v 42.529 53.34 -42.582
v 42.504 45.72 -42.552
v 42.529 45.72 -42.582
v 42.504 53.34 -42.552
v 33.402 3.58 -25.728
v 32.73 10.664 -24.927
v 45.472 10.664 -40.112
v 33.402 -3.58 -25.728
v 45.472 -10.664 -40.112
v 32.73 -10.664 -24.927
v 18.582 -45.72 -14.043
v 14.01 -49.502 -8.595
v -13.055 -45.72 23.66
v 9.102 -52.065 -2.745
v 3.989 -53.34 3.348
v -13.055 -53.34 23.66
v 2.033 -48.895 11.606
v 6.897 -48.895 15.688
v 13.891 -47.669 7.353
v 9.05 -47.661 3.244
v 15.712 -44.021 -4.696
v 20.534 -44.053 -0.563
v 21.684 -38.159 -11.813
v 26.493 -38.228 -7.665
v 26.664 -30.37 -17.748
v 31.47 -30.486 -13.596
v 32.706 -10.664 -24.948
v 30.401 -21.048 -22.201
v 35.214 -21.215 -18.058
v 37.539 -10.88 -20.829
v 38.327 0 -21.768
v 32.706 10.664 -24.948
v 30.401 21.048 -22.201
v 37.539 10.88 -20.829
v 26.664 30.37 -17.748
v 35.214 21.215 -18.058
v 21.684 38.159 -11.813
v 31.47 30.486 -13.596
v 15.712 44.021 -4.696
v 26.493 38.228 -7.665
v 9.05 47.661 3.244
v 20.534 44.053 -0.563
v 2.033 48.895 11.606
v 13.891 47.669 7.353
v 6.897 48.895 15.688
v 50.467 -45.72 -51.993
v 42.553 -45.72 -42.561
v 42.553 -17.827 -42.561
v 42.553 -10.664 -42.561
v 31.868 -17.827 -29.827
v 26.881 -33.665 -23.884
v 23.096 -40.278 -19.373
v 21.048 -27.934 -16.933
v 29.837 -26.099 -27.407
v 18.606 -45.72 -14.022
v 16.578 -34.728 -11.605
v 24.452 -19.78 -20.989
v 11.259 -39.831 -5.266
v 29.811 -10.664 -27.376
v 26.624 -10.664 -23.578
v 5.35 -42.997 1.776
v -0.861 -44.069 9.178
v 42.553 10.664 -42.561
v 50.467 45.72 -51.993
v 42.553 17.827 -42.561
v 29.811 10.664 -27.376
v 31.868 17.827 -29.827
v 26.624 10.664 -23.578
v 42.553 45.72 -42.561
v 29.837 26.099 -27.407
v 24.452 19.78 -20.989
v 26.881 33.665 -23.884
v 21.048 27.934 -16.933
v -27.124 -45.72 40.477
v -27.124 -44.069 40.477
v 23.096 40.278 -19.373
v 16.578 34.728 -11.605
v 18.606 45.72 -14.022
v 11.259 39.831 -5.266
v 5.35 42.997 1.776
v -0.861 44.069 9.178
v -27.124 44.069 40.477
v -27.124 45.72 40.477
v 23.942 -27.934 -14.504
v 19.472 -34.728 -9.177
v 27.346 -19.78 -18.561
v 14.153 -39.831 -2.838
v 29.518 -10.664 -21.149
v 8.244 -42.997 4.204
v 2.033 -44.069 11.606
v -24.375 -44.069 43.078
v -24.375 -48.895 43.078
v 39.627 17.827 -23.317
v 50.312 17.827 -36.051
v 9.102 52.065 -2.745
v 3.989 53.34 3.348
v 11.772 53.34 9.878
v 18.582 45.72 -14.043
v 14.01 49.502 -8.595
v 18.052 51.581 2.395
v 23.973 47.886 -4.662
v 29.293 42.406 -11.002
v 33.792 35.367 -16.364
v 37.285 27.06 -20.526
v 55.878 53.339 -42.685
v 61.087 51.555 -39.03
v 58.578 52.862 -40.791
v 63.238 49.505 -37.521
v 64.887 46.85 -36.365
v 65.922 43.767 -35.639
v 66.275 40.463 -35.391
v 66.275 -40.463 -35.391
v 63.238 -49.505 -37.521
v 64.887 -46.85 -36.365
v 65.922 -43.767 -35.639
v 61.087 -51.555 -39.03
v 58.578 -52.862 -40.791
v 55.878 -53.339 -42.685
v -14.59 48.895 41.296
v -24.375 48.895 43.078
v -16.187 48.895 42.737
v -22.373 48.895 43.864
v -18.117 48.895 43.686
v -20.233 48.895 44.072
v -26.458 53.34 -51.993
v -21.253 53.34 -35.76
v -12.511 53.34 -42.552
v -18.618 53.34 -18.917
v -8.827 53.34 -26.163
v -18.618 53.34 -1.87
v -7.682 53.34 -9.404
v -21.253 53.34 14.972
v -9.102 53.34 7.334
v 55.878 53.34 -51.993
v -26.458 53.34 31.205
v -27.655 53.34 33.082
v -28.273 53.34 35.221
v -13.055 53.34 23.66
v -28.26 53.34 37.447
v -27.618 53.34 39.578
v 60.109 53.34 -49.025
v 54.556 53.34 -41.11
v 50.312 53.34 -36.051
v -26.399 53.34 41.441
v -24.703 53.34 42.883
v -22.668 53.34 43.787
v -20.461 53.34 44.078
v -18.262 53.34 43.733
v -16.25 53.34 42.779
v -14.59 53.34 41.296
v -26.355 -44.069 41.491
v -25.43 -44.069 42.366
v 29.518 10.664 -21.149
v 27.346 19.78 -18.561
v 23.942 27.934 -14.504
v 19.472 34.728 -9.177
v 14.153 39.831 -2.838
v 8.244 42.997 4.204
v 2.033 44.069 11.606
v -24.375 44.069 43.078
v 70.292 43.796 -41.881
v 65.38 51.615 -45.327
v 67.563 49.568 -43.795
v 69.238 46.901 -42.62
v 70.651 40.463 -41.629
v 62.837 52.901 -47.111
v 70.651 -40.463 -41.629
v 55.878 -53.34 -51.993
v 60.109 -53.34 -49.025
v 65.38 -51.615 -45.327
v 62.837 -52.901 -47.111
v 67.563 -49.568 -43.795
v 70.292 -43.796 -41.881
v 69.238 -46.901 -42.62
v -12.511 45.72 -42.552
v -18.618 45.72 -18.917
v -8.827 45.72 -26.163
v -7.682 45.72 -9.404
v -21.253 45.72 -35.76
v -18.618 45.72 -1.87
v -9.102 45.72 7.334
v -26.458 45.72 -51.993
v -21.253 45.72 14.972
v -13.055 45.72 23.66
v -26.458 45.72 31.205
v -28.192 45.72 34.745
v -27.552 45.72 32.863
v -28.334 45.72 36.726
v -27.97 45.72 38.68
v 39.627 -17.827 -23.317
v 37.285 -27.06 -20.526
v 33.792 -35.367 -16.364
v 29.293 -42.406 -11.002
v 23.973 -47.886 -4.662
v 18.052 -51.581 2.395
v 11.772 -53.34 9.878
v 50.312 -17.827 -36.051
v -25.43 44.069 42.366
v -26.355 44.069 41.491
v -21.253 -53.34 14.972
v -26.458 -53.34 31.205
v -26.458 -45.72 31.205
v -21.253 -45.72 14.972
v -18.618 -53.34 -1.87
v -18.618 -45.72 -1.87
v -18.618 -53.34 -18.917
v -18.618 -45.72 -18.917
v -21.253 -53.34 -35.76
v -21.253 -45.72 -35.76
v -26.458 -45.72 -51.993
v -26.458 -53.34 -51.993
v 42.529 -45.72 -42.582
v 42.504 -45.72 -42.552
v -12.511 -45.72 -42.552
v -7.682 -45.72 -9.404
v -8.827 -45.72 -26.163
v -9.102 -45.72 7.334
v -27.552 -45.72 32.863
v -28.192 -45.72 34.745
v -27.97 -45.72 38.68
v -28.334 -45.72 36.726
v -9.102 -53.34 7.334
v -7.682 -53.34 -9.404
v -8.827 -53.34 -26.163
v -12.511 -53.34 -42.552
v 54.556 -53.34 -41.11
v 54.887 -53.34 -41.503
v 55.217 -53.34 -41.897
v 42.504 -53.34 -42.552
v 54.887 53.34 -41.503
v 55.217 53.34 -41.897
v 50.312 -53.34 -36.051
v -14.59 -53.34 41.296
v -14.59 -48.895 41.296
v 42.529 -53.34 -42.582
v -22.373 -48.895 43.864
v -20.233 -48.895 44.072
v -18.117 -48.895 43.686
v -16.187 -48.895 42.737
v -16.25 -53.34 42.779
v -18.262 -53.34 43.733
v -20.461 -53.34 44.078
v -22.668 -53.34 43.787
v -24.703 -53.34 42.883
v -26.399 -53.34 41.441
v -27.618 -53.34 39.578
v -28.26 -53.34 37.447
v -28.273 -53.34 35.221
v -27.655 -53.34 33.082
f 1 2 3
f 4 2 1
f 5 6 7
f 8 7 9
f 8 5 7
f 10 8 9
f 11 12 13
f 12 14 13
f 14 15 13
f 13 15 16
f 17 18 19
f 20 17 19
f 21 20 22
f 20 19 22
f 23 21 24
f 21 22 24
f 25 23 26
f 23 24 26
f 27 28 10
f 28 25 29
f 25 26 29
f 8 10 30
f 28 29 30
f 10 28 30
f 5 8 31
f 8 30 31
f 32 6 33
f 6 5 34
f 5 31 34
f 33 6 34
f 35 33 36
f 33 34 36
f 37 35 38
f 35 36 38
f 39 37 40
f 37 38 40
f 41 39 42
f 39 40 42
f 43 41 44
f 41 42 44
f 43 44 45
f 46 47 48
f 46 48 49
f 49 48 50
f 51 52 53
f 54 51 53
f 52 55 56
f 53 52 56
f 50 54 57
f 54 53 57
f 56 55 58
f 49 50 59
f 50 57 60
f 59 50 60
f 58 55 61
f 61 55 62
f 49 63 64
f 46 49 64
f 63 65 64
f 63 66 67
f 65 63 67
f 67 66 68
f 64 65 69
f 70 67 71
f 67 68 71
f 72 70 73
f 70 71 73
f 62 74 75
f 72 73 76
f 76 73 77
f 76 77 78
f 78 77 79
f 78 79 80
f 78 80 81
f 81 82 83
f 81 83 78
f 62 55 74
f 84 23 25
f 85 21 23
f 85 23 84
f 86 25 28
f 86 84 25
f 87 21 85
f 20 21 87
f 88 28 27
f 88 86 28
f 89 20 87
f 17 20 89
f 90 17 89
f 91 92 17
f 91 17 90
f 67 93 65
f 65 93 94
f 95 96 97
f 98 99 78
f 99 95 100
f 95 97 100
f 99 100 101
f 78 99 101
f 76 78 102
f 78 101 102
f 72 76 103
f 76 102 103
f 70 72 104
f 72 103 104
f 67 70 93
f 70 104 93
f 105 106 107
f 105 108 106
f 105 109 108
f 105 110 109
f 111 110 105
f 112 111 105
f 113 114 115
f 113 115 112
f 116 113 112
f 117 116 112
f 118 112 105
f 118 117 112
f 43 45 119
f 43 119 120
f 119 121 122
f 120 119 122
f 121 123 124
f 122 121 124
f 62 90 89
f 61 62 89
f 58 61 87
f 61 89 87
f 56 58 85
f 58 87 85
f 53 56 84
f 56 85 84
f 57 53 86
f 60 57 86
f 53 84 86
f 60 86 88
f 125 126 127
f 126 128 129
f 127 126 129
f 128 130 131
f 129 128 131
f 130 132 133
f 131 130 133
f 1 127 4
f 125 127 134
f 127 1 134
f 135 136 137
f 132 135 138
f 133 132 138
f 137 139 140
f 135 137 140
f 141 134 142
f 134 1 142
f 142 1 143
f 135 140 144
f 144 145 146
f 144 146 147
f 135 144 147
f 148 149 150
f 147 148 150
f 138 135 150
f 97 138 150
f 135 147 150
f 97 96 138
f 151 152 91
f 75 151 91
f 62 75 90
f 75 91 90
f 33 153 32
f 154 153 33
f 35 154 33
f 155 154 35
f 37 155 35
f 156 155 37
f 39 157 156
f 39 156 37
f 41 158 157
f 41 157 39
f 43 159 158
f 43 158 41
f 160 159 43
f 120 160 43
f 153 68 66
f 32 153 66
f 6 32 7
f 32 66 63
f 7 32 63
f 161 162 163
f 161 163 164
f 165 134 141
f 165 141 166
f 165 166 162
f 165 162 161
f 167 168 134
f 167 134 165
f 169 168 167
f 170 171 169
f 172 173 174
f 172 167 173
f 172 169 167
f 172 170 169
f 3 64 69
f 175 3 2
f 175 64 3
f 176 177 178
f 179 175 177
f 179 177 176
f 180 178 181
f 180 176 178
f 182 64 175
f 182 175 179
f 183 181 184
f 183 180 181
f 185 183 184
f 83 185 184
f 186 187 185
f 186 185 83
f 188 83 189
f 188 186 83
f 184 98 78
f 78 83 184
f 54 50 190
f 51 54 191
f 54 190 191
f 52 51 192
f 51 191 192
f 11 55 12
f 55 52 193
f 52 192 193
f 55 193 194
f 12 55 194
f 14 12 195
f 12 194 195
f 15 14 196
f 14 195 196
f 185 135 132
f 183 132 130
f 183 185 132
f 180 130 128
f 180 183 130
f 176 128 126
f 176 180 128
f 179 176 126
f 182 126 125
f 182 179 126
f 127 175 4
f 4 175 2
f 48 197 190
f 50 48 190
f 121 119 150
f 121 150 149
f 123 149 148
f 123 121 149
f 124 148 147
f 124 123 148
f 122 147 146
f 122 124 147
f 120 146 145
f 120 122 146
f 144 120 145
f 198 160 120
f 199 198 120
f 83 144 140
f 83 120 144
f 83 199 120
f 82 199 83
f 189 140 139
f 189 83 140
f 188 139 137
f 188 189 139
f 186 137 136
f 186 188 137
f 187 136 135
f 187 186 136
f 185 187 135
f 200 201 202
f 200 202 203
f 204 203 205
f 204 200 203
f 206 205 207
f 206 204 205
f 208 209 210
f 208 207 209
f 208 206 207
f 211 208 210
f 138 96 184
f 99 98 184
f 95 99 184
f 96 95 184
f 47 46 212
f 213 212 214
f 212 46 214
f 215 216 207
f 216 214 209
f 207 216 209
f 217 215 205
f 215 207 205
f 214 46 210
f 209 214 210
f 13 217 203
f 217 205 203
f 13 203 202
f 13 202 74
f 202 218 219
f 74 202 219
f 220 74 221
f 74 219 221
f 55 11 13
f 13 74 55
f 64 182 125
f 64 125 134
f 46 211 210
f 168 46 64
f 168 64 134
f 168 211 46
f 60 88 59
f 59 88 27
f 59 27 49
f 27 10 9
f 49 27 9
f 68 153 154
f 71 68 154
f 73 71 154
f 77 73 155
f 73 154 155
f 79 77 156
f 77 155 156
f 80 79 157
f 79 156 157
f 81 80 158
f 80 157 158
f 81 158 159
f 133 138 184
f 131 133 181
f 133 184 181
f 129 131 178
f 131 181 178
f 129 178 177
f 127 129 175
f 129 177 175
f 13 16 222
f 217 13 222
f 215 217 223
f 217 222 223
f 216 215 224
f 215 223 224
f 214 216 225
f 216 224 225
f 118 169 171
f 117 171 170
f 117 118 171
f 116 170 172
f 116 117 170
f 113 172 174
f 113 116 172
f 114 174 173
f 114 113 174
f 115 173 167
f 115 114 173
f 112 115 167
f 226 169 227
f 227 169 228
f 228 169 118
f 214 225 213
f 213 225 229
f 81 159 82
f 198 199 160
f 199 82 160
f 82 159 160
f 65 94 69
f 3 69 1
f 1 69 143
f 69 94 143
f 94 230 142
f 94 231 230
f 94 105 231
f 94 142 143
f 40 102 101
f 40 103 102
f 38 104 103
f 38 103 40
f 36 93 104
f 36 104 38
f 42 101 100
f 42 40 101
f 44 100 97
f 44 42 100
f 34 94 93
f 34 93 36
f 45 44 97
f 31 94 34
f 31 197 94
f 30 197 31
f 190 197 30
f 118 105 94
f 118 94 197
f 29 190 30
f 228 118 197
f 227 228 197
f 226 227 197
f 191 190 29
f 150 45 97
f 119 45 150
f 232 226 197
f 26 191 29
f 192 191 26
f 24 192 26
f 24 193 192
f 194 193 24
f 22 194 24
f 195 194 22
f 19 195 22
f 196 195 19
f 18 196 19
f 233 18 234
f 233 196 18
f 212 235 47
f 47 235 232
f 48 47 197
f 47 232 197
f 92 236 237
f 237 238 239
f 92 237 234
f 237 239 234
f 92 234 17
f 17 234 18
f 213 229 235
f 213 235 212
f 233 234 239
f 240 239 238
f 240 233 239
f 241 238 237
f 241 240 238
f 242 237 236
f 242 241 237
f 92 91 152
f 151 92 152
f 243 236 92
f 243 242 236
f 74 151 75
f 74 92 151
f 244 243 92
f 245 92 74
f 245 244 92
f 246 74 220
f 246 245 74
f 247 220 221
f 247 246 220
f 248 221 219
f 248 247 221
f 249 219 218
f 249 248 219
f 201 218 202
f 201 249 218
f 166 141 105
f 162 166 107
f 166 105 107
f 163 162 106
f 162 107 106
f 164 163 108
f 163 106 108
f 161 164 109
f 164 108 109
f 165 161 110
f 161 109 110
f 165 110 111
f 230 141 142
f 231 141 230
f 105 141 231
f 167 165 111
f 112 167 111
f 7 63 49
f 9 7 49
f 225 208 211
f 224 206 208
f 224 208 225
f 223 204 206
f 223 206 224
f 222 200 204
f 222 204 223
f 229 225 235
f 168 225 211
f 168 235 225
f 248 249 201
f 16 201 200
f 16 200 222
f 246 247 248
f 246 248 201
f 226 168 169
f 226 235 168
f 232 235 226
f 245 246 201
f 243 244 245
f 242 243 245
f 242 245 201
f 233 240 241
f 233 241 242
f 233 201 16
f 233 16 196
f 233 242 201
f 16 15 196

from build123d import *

# Parameters (mm, degrees)
F1_DEPTH  = 53.34
F2_W      = 4.826
F2_H      = 32.1946403572
F3_DEPTH  = 6.35
F5_DEPTH  = 106.68
F7_W      = 91.44
F7_H      = 183.6228075896
F8_DEPTH  = 58.928
F9_DEPTH  = 25.4
F10_R     = 12.8774151417
F11_DEPTH = 10.16
F13_DEPTH = 25.4
F15_DEPTH = 3.81


# Not quite as in the source:
# - a feature names something its author has since deleted; it is built from what else it names


with BuildPart() as f1:
    # F0 (on Front) → F1 (new body, symmetric)
    with BuildSketch(Plane.XZ):
        with BuildLine():
            ThreePointArc((-26.4580316219, 31.2050478526), (-18.2875299748, -10.3937397156), (-26.4580316219, -51.9925272838))
            Line((-26.4580316219, -51.9925272838), (55.8778569108, -51.9925272838))
            Line((55.8778569108, -51.9925272838), (70.650836429, -41.6293909539))
            Line((70.650836429, -41.6293909539), (66.2748063527, -35.3912212887))
            Line((66.2748063527, -35.3912212887), (55.8778569108, -42.6846047493))
            Line((55.8778569108, -42.6846047493), (-14.5902915946, 41.2960643955))
            ThreePointArc((-14.5902915946, 41.2960643955), (-25.6027276184, 42.2233043466), (-26.4580316219, 31.2050478526))
        make_face()
    extrude(amount=F1_DEPTH, both=True)

    # F2 (on face) → F3 (cut)
    with BuildSketch(Plane(origin=(11.772407622, 0, 9.8782228937), x_dir=(0, 1, 0), z_dir=(0.7660444431, 0, 0.6427876097))):
        with BuildLine():
            ThreePointArc((-44.069, 28.7653259742), (-47.673235573, 18.4461288519), (-48.895, 7.584101647))
            Line((-48.895, 7.584101647), (-44.069, 7.584101647))
            Line((-44.069, 7.584101647), (-44.069, 28.7653259742))
        make_face()
        with BuildLine():
            ThreePointArc((44.069, 28.7653259742), (47.673235573, 18.4461288519), (48.895, 7.584101647))
            Line((48.895, 7.584101647), (48.895, 41.0130793115))
            Line((48.895, 41.0130793115), (44.069, 41.0130793115))
            Line((44.069, 41.0130793115), (44.069, 28.7653259742))
        make_face()
        with BuildLine():
            Line((-44.069, 41.0130793115), (-35.6822711903, 41.0130793115))
            ThreePointArc((-35.6822711903, 41.0130793115), (-19.4449371571, 52.4462844288), (0, 56.479101647))
            Line((0, 56.479101647), (0, 73.2077196687))
            Line((0, 73.2077196687), (-44.069, 73.2077196687))
            Line((-44.069, 73.2077196687), (-44.069, 41.0130793115))
        make_face()
        with Locations((-46.482, 57.1103994901)):
            Rectangle(F2_W, F2_H)
        with BuildLine():
            ThreePointArc((0, 56.479101647), (-19.4449371571, 52.4462844288), (-35.6822711903, 41.0130793115))
            Line((-35.6822711903, 41.0130793115), (-28.7155047544, 41.0130793115))
            ThreePointArc((-28.7155047544, 41.0130793115), (-15.3116809054, 48.9075718407), (0, 51.653101647))
            Line((0, 51.653101647), (0, 56.479101647))
        make_face()
        with BuildLine():
            Line((28.7155047544, 41.0130793115), (35.6822711903, 41.0130793115))
            ThreePointArc((35.6822711903, 41.0130793115), (19.4449371571, 52.4462844288), (0, 56.479101647))
            Line((0, 56.479101647), (0, 51.653101647))
            ThreePointArc((0, 51.653101647), (15.3116809054, 48.9075718407), (28.7155047544, 41.0130793115))
        make_face()
        with BuildLine():
            Line((-48.895, 41.0130793115), (-48.895, 7.584101647))
            ThreePointArc((-48.895, 7.584101647), (-47.673235573, 18.4461288519), (-44.069, 28.7653259742))
            Line((-44.069, 28.7653259742), (-44.069, 41.0130793115))
            Line((-44.069, 41.0130793115), (-48.895, 41.0130793115))
        make_face()
        with BuildLine():
            ThreePointArc((0, 56.479101647), (19.4449371571, 52.4462844288), (35.6822711903, 41.0130793115))
            Line((35.6822711903, 41.0130793115), (44.069, 41.0130793115))
            Line((44.069, 41.0130793115), (44.069, 73.082752475))
            Line((44.069, 73.082752475), (0, 73.2077196687))
            Line((0, 73.2077196687), (0, 56.479101647))
        make_face()
        with BuildLine():
            Line((-44.069, 41.0130793115), (-44.069, 28.7653259742))
            ThreePointArc((-44.069, 28.7653259742), (-40.3431305128, 35.2093228303), (-35.6822711903, 41.0130793115))
            Line((-35.6822711903, 41.0130793115), (-44.069, 41.0130793115))
        make_face()
        with BuildLine():
            ThreePointArc((-35.6822711903, 41.0130793115), (-40.3431305128, 35.2093228303), (-44.069, 28.7653259742))
            Line((-44.069, 28.7653259742), (-44.069, 7.584101647))
            ThreePointArc((-44.069, 7.584101647), (-40.0470993957, 25.9772142435), (-28.7155047544, 41.0130793115))
            Line((-28.7155047544, 41.0130793115), (-35.6822711903, 41.0130793115))
        make_face()
        with BuildLine():
            Line((44.069, 7.584101647), (44.069, 28.7653259742))
            ThreePointArc((44.069, 28.7653259742), (40.3431305128, 35.2093228303), (35.6822711903, 41.0130793115))
            Line((35.6822711903, 41.0130793115), (28.7155047544, 41.0130793115))
            ThreePointArc((28.7155047544, 41.0130793115), (40.0470993957, 25.9772142435), (44.069, 7.584101647))
        make_face()
        with BuildLine():
            Line((-44.069, 7.584101647), (-48.895, 7.584101647))
            ThreePointArc((-48.895, 7.584101647), (0, -41.310898353), (48.895, 7.584101647))
            ThreePointArc((48.895, 7.584101647), (47.673235573, 18.4461288519), (44.069, 28.7653259742))
            Line((44.069, 28.7653259742), (44.069, 7.584101647))
            ThreePointArc((44.069, 7.584101647), (0, -36.484898353), (-44.069, 7.584101647))
        make_face()
        with BuildLine():
            Line((0, 7.584101647), (-44.069, 7.584101647))
            ThreePointArc((-44.069, 7.584101647), (0, -36.484898353), (44.069, 7.584101647))
            ThreePointArc((44.069, 7.584101647), (40.0470993957, 25.9772142435), (28.7155047544, 41.0130793115))
            Line((28.7155047544, 41.0130793115), (0, 41.0130793115))
            Line((0, 41.0130793115), (0, 7.584101647))
        make_face()
        with BuildLine():
            ThreePointArc((-28.7155047544, 41.0130793115), (-40.0470993957, 25.9772142435), (-44.069, 7.584101647))
            Line((-44.069, 7.584101647), (0, 7.584101647))
            Line((0, 7.584101647), (0, 41.0130793115))
            Line((0, 41.0130793115), (-28.7155047544, 41.0130793115))
        make_face()
        with BuildLine():
            ThreePointArc((35.6822711903, 41.0130793115), (40.3431305128, 35.2093228303), (44.069, 28.7653259742))
            Line((44.069, 28.7653259742), (44.069, 41.0130793115))
            Line((44.069, 41.0130793115), (35.6822711903, 41.0130793115))
        make_face()
        Polygon((44.069, 41.0130793115), (48.895, 41.0130793115), (48.895, 73.2077196687), (44.069, 73.2077196687), (44.069, 73.082752475), align=None)
    extrude(amount=-F3_DEPTH, mode=Mode.SUBTRACT)

    # F4 (on face) → F5 (cut, through all)
    with BuildSketch(Plane.XZ.offset(53.34)):
        with BuildLine():
            Line((42.5035902841, -42.5519285295), (-13.0547319913, 23.6599016408))
            ThreePointArc((-13.0547319913, 23.6599016408), (-7.6819414216, -9.4041517757), (-12.5113723521, -42.5519285295))
            Line((-12.5113723521, -42.5519285295), (42.5035902841, -42.5519285295))
        make_face()
    extrude(amount=-F5_DEPTH, mode=Mode.SUBTRACT)

    # F7 (on face) → F8 (cut)
    with BuildSketch(Plane(origin=(-41.1275322828, 0, -34.5100971697), x_dir=(0, 1, 0), z_dir=(0.7660444431, 0, 0.6427876097))):
        with Locations((0, -8.2484856248)):
            Rectangle(F7_W, F7_H)
    extrude(amount=F8_DEPTH, mode=Mode.SUBTRACT)

    # F2 (on face) → F9 (cut)
    with BuildSketch(Plane(origin=(11.772407622, 0, 9.8782228937), x_dir=(0, 1, 0), z_dir=(0.7660444431, 0, 0.6427876097))):
        with BuildLine():
            ThreePointArc((-28.7155047544, 41.0130793115), (-40.0470993957, 25.9772142435), (-44.069, 7.584101647))
            Line((-44.069, 7.584101647), (0, 7.584101647))
            Line((0, 7.584101647), (0, 41.0130793115))
            Line((0, 41.0130793115), (-28.7155047544, 41.0130793115))
        make_face()
        with BuildLine():
            Line((0, 7.584101647), (-44.069, 7.584101647))
            ThreePointArc((-44.069, 7.584101647), (0, -36.484898353), (44.069, 7.584101647))
            ThreePointArc((44.069, 7.584101647), (40.0470993957, 25.9772142435), (28.7155047544, 41.0130793115))
            Line((28.7155047544, 41.0130793115), (0, 41.0130793115))
            Line((0, 41.0130793115), (0, 7.584101647))
        make_face()
        with BuildLine():
            ThreePointArc((-35.6822711903, 41.0130793115), (-40.3431305128, 35.2093228303), (-44.069, 28.7653259742))
            Line((-44.069, 28.7653259742), (-44.069, 7.584101647))
            ThreePointArc((-44.069, 7.584101647), (-40.0470993957, 25.9772142435), (-28.7155047544, 41.0130793115))
            Line((-28.7155047544, 41.0130793115), (-35.6822711903, 41.0130793115))
        make_face()
        with BuildLine():
            Line((44.069, 7.584101647), (44.069, 28.7653259742))
            ThreePointArc((44.069, 28.7653259742), (40.3431305128, 35.2093228303), (35.6822711903, 41.0130793115))
            Line((35.6822711903, 41.0130793115), (28.7155047544, 41.0130793115))
            ThreePointArc((28.7155047544, 41.0130793115), (40.0470993957, 25.9772142435), (44.069, 7.584101647))
        make_face()
        with BuildLine():
            Line((28.7155047544, 41.0130793115), (35.6822711903, 41.0130793115))
            ThreePointArc((35.6822711903, 41.0130793115), (19.4449371571, 52.4462844288), (0, 56.479101647))
            Line((0, 56.479101647), (0, 51.653101647))
            ThreePointArc((0, 51.653101647), (15.3116809054, 48.9075718407), (28.7155047544, 41.0130793115))
        make_face()
        with BuildLine():
            ThreePointArc((0, 56.479101647), (-19.4449371571, 52.4462844288), (-35.6822711903, 41.0130793115))
            Line((-35.6822711903, 41.0130793115), (-28.7155047544, 41.0130793115))
            ThreePointArc((-28.7155047544, 41.0130793115), (-15.3116809054, 48.9075718407), (0, 51.653101647))
            Line((0, 51.653101647), (0, 56.479101647))
        make_face()
        with BuildLine():
            Line((-44.069, 41.0130793115), (-35.6822711903, 41.0130793115))
            ThreePointArc((-35.6822711903, 41.0130793115), (-19.4449371571, 52.4462844288), (0, 56.479101647))
            Line((0, 56.479101647), (0, 73.2077196687))
            Line((0, 73.2077196687), (-44.069, 73.2077196687))
            Line((-44.069, 73.2077196687), (-44.069, 41.0130793115))
        make_face()
        with BuildLine():
            Line((-44.069, 41.0130793115), (-44.069, 28.7653259742))
            ThreePointArc((-44.069, 28.7653259742), (-40.3431305128, 35.2093228303), (-35.6822711903, 41.0130793115))
            Line((-35.6822711903, 41.0130793115), (-44.069, 41.0130793115))
        make_face()
        with BuildLine():
            ThreePointArc((0, 56.479101647), (19.4449371571, 52.4462844288), (35.6822711903, 41.0130793115))
            Line((35.6822711903, 41.0130793115), (44.069, 41.0130793115))
            Line((44.069, 41.0130793115), (44.069, 73.082752475))
            Line((44.069, 73.082752475), (0, 73.2077196687))
            Line((0, 73.2077196687), (0, 56.479101647))
        make_face()
        with BuildLine():
            ThreePointArc((35.6822711903, 41.0130793115), (40.3431305128, 35.2093228303), (44.069, 28.7653259742))
            Line((44.069, 28.7653259742), (44.069, 41.0130793115))
            Line((44.069, 41.0130793115), (35.6822711903, 41.0130793115))
        make_face()
        with BuildLine():
            Line((0, 51.653101647), (0, 41.0130793115))
            Line((0, 41.0130793115), (28.7155047544, 41.0130793115))
            ThreePointArc((28.7155047544, 41.0130793115), (15.3116809054, 48.9075718407), (0, 51.653101647))
        make_face()
        with BuildLine():
            ThreePointArc((0, 51.653101647), (-15.3116809054, 48.9075718407), (-28.7155047544, 41.0130793115))
            Line((-28.7155047544, 41.0130793115), (0, 41.0130793115))
            Line((0, 41.0130793115), (0, 51.653101647))
        make_face()
    extrude(amount=-F9_DEPTH, mode=Mode.SUBTRACT)

    # F10
    f10_edges = [f1.edges().sort_by_distance(p)[0] for p in [
        (68.462821, -53.34, -38.510306),
        (68.462821, 53.34, -38.510306),
    ]]
    fillet(f10_edges, radius=F10_R)

    # F2 (on face) → F11 (cut)
    with BuildSketch(Plane(origin=(11.772407622, 0, 9.8782228937), x_dir=(0, 1, 0), z_dir=(0.7660444431, 0, 0.6427876097))):
        with BuildLine():
            ThreePointArc((-17.8272557182, -43.3336769488), (-42.4057040411, -27.2576552243), (-53.34, 0))
            Line((-53.34, 0), (-53.34, -59.9567629397))
            Line((-53.34, -59.9567629397), (-17.8272557182, -59.9567629397))
            Line((-17.8272557182, -59.9567629397), (-17.8272557182, -43.3336769488))
        make_face()
        with BuildLine():
            Line((53.34, -59.9567629397), (53.34, 0))
            ThreePointArc((53.34, 0), (42.4057040411, -27.2576552243), (17.8272557182, -43.3336769488))
            Line((17.8272557182, -43.3336769488), (17.8272557182, -59.9567629397))
            Line((17.8272557182, -59.9567629397), (53.34, -59.9567629397))
        make_face()
    extrude(amount=-F11_DEPTH, mode=Mode.SUBTRACT)

    # F12 (on face) → F13 (cut)
    with BuildSketch(Plane(origin=(6.9080254082, 0, 5.7965215722), x_dir=(0, 1, 0), z_dir=(0.7660444431, 0, 0.6427876097))):
        with BuildLine():
            ThreePointArc((0, -36.484898353), (-5.3721205729, -36.1562353608), (-10.6641114754, -35.1751486673))
            Line((-10.6641114754, -35.1751486673), (-10.6641114754, -40.1337959538))
            ThreePointArc((-10.6641114754, -40.1337959538), (-5.3644394772, -41.0157318311), (0, -41.310898353))
            Line((0, -41.310898353), (0, -36.484898353))
        make_face()
        with BuildLine():
            ThreePointArc((10.6641114754, -35.1751486673), (5.3721205729, -36.1562353608), (0, -36.484898353))
            Line((0, -36.484898353), (0, -41.310898353))
            ThreePointArc((0, -41.310898353), (5.3644394772, -41.0157318311), (10.6641114754, -40.1337959538))
            Line((10.6641114754, -40.1337959538), (10.6641114754, -35.1751486673))
        make_face()
    extrude(amount=-F13_DEPTH, mode=Mode.SUBTRACT)

    # F14 (on face) → F15 (cut)
    with BuildSketch(Plane(origin=(4.0139346614, 0, 3.3680910939), x_dir=(0, -1, 0), z_dir=(-0.7660444431, 0, -0.6427876097))):
        with BuildLine():
            ThreePointArc((10.6641114754, -40.1337959538), (0, -41.310898353), (-10.6641114754, -40.1337959538))
            Line((-10.6641114754, -40.1337959538), (-10.6641114754, -59.9567629397))
            Line((-10.6641114754, -59.9567629397), (10.6641114754, -59.9567629397))
            Line((10.6641114754, -59.9567629397), (10.6641114754, -40.1337959538))
        make_face()
    extrude(amount=-F15_DEPTH, mode=Mode.SUBTRACT)


solid = f1.part
